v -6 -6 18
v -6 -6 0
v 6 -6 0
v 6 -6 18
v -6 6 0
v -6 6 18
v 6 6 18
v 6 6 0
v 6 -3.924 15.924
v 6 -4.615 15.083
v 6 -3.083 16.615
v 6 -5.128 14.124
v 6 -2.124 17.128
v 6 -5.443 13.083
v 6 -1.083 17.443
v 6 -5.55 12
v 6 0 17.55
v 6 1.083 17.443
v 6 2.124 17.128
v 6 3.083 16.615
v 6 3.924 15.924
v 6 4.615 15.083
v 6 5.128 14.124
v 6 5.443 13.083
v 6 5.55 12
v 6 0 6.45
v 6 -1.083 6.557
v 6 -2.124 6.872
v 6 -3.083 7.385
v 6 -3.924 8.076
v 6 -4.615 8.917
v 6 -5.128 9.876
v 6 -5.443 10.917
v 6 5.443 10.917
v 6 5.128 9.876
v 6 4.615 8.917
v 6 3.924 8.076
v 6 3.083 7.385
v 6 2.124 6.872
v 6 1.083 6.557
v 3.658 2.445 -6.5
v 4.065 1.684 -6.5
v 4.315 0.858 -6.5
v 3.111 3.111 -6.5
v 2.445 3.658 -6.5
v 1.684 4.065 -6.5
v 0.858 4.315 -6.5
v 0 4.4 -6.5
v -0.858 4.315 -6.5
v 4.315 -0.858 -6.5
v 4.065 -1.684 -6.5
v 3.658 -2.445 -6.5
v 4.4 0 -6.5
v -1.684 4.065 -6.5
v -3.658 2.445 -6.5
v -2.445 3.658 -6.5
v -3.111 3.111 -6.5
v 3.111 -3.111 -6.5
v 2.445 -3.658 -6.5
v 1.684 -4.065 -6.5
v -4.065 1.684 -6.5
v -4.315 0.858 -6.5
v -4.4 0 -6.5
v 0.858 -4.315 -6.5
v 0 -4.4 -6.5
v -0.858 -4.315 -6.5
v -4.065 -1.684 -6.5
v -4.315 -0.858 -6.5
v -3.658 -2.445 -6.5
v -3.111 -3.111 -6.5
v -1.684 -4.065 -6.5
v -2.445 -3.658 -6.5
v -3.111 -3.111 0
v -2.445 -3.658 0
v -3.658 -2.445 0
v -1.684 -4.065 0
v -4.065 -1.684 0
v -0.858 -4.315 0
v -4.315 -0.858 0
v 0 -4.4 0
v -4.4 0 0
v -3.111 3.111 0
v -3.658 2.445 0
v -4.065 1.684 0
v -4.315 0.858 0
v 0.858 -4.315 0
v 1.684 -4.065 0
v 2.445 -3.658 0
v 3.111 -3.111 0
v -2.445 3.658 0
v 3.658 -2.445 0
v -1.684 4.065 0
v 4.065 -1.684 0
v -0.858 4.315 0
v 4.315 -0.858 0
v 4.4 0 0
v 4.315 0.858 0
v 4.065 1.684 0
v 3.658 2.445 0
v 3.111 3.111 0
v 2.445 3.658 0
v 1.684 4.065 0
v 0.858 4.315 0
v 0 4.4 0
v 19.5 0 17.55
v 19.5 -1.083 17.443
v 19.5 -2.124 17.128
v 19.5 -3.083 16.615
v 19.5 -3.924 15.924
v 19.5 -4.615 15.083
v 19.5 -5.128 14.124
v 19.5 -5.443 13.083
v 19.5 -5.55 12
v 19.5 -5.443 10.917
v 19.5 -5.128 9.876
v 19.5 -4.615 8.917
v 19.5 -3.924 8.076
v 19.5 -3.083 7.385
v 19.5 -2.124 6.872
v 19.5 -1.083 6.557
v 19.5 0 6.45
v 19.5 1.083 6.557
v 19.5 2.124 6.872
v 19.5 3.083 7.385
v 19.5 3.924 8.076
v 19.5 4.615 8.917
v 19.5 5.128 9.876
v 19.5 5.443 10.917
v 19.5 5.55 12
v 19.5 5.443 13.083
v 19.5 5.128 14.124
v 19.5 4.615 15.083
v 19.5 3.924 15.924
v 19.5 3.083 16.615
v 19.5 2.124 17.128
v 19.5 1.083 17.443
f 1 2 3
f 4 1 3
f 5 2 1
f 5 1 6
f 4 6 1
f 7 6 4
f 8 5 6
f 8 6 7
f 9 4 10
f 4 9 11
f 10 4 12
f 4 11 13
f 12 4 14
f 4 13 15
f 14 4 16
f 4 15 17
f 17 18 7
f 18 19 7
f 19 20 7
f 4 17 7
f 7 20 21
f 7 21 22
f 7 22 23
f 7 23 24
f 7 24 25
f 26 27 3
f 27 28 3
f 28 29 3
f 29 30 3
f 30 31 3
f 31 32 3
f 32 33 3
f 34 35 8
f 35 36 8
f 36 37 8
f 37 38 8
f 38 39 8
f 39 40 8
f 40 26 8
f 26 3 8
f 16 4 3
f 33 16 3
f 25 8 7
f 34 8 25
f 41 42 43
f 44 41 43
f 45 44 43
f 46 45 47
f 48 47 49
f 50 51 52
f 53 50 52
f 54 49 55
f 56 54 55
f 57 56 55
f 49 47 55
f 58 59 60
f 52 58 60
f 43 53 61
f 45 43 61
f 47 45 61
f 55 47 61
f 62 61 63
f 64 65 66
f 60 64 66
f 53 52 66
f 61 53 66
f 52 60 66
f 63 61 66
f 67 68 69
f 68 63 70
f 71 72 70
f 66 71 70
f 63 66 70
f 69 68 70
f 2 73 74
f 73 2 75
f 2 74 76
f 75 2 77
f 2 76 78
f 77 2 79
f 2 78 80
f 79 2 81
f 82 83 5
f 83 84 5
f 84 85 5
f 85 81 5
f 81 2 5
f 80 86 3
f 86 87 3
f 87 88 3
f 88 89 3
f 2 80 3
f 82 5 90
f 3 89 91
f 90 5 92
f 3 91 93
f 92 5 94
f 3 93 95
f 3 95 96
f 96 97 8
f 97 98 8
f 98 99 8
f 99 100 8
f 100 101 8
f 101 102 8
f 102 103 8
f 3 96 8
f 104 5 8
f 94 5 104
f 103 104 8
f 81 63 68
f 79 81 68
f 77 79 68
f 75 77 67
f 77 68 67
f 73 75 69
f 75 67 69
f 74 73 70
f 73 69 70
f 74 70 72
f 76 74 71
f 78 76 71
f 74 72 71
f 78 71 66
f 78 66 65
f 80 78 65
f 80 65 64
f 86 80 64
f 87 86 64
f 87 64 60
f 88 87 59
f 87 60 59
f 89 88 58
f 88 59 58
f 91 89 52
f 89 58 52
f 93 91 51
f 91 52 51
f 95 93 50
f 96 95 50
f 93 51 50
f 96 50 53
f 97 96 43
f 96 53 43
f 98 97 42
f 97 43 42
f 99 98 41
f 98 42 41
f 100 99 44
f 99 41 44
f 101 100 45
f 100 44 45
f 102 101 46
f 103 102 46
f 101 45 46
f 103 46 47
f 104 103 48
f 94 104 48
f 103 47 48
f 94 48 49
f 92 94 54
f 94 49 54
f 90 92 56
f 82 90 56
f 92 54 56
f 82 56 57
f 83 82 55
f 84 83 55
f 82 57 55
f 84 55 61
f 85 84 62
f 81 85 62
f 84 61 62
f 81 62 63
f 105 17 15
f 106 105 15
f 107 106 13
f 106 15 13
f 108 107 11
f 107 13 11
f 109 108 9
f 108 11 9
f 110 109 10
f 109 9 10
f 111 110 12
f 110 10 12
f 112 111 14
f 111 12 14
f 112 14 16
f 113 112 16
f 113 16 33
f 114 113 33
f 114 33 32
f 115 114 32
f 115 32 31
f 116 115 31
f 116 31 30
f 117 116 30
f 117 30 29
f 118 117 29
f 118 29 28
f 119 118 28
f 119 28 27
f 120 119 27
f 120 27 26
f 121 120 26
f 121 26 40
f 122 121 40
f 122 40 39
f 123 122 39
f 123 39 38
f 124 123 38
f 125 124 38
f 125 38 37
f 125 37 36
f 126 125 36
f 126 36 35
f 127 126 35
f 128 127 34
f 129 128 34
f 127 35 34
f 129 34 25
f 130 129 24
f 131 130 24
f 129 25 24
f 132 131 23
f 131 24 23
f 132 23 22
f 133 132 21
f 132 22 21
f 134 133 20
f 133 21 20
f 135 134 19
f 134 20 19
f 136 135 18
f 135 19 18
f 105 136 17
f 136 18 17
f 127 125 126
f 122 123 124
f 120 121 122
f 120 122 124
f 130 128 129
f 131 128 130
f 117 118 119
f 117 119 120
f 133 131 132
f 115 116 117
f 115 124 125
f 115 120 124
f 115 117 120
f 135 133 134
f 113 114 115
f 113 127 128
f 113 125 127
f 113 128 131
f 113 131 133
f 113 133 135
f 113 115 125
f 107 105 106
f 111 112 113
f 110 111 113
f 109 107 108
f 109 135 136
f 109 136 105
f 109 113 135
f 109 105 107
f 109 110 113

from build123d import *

# Parameters (mm, degrees)
RC_START                                     = -6.5
SKETCH1_R                                    = 4.4
RC_1_8_CONNECTION_THREAD_CORE_ENVELOPE_DEPTH = 6.5
SKETCH2_W                                    = 12
SKETCH2_H                                    = 12
ELBOW_BODY_AND_12_MM_WRENCH_FLATS_DEPTH      = 18
MALE_START                                   = 5.8
SKETCH3_R                                    = 5.55
MALE_4_JIC_OUTLET_ENVELOPE_DEPTH             = 13.7


with BuildPart() as part:
    # Sketch1 → Rc 1/8 connection, thread core envelope (new body)
    with BuildSketch(Plane.XY.offset(RC_START)):
        with Locations(Location((0, 0, 0), (0, 0, 180))):
            Circle(SKETCH1_R)
    extrude(amount=RC_1_8_CONNECTION_THREAD_CORE_ENVELOPE_DEPTH)

    # Sketch2 → Elbow body and 12 mm wrench flats (add)
    with BuildSketch(Plane.XY):
        Rectangle(SKETCH2_W, SKETCH2_H)
    extrude(amount=ELBOW_BODY_AND_12_MM_WRENCH_FLATS_DEPTH)

    # Sketch3 → Male -4 JIC outlet envelope (add)
    with BuildSketch(Plane(origin=(0, 0, 0), x_dir=(0, 0, -1), z_dir=(1, 0, 0)).offset(MALE_START)):
        with Locations(Location((-12, 0, 0), (0, 0, 180))):
            Circle(SKETCH3_R)
    extrude(amount=MALE_4_JIC_OUTLET_ENVELOPE_DEPTH)


solid = part.part
